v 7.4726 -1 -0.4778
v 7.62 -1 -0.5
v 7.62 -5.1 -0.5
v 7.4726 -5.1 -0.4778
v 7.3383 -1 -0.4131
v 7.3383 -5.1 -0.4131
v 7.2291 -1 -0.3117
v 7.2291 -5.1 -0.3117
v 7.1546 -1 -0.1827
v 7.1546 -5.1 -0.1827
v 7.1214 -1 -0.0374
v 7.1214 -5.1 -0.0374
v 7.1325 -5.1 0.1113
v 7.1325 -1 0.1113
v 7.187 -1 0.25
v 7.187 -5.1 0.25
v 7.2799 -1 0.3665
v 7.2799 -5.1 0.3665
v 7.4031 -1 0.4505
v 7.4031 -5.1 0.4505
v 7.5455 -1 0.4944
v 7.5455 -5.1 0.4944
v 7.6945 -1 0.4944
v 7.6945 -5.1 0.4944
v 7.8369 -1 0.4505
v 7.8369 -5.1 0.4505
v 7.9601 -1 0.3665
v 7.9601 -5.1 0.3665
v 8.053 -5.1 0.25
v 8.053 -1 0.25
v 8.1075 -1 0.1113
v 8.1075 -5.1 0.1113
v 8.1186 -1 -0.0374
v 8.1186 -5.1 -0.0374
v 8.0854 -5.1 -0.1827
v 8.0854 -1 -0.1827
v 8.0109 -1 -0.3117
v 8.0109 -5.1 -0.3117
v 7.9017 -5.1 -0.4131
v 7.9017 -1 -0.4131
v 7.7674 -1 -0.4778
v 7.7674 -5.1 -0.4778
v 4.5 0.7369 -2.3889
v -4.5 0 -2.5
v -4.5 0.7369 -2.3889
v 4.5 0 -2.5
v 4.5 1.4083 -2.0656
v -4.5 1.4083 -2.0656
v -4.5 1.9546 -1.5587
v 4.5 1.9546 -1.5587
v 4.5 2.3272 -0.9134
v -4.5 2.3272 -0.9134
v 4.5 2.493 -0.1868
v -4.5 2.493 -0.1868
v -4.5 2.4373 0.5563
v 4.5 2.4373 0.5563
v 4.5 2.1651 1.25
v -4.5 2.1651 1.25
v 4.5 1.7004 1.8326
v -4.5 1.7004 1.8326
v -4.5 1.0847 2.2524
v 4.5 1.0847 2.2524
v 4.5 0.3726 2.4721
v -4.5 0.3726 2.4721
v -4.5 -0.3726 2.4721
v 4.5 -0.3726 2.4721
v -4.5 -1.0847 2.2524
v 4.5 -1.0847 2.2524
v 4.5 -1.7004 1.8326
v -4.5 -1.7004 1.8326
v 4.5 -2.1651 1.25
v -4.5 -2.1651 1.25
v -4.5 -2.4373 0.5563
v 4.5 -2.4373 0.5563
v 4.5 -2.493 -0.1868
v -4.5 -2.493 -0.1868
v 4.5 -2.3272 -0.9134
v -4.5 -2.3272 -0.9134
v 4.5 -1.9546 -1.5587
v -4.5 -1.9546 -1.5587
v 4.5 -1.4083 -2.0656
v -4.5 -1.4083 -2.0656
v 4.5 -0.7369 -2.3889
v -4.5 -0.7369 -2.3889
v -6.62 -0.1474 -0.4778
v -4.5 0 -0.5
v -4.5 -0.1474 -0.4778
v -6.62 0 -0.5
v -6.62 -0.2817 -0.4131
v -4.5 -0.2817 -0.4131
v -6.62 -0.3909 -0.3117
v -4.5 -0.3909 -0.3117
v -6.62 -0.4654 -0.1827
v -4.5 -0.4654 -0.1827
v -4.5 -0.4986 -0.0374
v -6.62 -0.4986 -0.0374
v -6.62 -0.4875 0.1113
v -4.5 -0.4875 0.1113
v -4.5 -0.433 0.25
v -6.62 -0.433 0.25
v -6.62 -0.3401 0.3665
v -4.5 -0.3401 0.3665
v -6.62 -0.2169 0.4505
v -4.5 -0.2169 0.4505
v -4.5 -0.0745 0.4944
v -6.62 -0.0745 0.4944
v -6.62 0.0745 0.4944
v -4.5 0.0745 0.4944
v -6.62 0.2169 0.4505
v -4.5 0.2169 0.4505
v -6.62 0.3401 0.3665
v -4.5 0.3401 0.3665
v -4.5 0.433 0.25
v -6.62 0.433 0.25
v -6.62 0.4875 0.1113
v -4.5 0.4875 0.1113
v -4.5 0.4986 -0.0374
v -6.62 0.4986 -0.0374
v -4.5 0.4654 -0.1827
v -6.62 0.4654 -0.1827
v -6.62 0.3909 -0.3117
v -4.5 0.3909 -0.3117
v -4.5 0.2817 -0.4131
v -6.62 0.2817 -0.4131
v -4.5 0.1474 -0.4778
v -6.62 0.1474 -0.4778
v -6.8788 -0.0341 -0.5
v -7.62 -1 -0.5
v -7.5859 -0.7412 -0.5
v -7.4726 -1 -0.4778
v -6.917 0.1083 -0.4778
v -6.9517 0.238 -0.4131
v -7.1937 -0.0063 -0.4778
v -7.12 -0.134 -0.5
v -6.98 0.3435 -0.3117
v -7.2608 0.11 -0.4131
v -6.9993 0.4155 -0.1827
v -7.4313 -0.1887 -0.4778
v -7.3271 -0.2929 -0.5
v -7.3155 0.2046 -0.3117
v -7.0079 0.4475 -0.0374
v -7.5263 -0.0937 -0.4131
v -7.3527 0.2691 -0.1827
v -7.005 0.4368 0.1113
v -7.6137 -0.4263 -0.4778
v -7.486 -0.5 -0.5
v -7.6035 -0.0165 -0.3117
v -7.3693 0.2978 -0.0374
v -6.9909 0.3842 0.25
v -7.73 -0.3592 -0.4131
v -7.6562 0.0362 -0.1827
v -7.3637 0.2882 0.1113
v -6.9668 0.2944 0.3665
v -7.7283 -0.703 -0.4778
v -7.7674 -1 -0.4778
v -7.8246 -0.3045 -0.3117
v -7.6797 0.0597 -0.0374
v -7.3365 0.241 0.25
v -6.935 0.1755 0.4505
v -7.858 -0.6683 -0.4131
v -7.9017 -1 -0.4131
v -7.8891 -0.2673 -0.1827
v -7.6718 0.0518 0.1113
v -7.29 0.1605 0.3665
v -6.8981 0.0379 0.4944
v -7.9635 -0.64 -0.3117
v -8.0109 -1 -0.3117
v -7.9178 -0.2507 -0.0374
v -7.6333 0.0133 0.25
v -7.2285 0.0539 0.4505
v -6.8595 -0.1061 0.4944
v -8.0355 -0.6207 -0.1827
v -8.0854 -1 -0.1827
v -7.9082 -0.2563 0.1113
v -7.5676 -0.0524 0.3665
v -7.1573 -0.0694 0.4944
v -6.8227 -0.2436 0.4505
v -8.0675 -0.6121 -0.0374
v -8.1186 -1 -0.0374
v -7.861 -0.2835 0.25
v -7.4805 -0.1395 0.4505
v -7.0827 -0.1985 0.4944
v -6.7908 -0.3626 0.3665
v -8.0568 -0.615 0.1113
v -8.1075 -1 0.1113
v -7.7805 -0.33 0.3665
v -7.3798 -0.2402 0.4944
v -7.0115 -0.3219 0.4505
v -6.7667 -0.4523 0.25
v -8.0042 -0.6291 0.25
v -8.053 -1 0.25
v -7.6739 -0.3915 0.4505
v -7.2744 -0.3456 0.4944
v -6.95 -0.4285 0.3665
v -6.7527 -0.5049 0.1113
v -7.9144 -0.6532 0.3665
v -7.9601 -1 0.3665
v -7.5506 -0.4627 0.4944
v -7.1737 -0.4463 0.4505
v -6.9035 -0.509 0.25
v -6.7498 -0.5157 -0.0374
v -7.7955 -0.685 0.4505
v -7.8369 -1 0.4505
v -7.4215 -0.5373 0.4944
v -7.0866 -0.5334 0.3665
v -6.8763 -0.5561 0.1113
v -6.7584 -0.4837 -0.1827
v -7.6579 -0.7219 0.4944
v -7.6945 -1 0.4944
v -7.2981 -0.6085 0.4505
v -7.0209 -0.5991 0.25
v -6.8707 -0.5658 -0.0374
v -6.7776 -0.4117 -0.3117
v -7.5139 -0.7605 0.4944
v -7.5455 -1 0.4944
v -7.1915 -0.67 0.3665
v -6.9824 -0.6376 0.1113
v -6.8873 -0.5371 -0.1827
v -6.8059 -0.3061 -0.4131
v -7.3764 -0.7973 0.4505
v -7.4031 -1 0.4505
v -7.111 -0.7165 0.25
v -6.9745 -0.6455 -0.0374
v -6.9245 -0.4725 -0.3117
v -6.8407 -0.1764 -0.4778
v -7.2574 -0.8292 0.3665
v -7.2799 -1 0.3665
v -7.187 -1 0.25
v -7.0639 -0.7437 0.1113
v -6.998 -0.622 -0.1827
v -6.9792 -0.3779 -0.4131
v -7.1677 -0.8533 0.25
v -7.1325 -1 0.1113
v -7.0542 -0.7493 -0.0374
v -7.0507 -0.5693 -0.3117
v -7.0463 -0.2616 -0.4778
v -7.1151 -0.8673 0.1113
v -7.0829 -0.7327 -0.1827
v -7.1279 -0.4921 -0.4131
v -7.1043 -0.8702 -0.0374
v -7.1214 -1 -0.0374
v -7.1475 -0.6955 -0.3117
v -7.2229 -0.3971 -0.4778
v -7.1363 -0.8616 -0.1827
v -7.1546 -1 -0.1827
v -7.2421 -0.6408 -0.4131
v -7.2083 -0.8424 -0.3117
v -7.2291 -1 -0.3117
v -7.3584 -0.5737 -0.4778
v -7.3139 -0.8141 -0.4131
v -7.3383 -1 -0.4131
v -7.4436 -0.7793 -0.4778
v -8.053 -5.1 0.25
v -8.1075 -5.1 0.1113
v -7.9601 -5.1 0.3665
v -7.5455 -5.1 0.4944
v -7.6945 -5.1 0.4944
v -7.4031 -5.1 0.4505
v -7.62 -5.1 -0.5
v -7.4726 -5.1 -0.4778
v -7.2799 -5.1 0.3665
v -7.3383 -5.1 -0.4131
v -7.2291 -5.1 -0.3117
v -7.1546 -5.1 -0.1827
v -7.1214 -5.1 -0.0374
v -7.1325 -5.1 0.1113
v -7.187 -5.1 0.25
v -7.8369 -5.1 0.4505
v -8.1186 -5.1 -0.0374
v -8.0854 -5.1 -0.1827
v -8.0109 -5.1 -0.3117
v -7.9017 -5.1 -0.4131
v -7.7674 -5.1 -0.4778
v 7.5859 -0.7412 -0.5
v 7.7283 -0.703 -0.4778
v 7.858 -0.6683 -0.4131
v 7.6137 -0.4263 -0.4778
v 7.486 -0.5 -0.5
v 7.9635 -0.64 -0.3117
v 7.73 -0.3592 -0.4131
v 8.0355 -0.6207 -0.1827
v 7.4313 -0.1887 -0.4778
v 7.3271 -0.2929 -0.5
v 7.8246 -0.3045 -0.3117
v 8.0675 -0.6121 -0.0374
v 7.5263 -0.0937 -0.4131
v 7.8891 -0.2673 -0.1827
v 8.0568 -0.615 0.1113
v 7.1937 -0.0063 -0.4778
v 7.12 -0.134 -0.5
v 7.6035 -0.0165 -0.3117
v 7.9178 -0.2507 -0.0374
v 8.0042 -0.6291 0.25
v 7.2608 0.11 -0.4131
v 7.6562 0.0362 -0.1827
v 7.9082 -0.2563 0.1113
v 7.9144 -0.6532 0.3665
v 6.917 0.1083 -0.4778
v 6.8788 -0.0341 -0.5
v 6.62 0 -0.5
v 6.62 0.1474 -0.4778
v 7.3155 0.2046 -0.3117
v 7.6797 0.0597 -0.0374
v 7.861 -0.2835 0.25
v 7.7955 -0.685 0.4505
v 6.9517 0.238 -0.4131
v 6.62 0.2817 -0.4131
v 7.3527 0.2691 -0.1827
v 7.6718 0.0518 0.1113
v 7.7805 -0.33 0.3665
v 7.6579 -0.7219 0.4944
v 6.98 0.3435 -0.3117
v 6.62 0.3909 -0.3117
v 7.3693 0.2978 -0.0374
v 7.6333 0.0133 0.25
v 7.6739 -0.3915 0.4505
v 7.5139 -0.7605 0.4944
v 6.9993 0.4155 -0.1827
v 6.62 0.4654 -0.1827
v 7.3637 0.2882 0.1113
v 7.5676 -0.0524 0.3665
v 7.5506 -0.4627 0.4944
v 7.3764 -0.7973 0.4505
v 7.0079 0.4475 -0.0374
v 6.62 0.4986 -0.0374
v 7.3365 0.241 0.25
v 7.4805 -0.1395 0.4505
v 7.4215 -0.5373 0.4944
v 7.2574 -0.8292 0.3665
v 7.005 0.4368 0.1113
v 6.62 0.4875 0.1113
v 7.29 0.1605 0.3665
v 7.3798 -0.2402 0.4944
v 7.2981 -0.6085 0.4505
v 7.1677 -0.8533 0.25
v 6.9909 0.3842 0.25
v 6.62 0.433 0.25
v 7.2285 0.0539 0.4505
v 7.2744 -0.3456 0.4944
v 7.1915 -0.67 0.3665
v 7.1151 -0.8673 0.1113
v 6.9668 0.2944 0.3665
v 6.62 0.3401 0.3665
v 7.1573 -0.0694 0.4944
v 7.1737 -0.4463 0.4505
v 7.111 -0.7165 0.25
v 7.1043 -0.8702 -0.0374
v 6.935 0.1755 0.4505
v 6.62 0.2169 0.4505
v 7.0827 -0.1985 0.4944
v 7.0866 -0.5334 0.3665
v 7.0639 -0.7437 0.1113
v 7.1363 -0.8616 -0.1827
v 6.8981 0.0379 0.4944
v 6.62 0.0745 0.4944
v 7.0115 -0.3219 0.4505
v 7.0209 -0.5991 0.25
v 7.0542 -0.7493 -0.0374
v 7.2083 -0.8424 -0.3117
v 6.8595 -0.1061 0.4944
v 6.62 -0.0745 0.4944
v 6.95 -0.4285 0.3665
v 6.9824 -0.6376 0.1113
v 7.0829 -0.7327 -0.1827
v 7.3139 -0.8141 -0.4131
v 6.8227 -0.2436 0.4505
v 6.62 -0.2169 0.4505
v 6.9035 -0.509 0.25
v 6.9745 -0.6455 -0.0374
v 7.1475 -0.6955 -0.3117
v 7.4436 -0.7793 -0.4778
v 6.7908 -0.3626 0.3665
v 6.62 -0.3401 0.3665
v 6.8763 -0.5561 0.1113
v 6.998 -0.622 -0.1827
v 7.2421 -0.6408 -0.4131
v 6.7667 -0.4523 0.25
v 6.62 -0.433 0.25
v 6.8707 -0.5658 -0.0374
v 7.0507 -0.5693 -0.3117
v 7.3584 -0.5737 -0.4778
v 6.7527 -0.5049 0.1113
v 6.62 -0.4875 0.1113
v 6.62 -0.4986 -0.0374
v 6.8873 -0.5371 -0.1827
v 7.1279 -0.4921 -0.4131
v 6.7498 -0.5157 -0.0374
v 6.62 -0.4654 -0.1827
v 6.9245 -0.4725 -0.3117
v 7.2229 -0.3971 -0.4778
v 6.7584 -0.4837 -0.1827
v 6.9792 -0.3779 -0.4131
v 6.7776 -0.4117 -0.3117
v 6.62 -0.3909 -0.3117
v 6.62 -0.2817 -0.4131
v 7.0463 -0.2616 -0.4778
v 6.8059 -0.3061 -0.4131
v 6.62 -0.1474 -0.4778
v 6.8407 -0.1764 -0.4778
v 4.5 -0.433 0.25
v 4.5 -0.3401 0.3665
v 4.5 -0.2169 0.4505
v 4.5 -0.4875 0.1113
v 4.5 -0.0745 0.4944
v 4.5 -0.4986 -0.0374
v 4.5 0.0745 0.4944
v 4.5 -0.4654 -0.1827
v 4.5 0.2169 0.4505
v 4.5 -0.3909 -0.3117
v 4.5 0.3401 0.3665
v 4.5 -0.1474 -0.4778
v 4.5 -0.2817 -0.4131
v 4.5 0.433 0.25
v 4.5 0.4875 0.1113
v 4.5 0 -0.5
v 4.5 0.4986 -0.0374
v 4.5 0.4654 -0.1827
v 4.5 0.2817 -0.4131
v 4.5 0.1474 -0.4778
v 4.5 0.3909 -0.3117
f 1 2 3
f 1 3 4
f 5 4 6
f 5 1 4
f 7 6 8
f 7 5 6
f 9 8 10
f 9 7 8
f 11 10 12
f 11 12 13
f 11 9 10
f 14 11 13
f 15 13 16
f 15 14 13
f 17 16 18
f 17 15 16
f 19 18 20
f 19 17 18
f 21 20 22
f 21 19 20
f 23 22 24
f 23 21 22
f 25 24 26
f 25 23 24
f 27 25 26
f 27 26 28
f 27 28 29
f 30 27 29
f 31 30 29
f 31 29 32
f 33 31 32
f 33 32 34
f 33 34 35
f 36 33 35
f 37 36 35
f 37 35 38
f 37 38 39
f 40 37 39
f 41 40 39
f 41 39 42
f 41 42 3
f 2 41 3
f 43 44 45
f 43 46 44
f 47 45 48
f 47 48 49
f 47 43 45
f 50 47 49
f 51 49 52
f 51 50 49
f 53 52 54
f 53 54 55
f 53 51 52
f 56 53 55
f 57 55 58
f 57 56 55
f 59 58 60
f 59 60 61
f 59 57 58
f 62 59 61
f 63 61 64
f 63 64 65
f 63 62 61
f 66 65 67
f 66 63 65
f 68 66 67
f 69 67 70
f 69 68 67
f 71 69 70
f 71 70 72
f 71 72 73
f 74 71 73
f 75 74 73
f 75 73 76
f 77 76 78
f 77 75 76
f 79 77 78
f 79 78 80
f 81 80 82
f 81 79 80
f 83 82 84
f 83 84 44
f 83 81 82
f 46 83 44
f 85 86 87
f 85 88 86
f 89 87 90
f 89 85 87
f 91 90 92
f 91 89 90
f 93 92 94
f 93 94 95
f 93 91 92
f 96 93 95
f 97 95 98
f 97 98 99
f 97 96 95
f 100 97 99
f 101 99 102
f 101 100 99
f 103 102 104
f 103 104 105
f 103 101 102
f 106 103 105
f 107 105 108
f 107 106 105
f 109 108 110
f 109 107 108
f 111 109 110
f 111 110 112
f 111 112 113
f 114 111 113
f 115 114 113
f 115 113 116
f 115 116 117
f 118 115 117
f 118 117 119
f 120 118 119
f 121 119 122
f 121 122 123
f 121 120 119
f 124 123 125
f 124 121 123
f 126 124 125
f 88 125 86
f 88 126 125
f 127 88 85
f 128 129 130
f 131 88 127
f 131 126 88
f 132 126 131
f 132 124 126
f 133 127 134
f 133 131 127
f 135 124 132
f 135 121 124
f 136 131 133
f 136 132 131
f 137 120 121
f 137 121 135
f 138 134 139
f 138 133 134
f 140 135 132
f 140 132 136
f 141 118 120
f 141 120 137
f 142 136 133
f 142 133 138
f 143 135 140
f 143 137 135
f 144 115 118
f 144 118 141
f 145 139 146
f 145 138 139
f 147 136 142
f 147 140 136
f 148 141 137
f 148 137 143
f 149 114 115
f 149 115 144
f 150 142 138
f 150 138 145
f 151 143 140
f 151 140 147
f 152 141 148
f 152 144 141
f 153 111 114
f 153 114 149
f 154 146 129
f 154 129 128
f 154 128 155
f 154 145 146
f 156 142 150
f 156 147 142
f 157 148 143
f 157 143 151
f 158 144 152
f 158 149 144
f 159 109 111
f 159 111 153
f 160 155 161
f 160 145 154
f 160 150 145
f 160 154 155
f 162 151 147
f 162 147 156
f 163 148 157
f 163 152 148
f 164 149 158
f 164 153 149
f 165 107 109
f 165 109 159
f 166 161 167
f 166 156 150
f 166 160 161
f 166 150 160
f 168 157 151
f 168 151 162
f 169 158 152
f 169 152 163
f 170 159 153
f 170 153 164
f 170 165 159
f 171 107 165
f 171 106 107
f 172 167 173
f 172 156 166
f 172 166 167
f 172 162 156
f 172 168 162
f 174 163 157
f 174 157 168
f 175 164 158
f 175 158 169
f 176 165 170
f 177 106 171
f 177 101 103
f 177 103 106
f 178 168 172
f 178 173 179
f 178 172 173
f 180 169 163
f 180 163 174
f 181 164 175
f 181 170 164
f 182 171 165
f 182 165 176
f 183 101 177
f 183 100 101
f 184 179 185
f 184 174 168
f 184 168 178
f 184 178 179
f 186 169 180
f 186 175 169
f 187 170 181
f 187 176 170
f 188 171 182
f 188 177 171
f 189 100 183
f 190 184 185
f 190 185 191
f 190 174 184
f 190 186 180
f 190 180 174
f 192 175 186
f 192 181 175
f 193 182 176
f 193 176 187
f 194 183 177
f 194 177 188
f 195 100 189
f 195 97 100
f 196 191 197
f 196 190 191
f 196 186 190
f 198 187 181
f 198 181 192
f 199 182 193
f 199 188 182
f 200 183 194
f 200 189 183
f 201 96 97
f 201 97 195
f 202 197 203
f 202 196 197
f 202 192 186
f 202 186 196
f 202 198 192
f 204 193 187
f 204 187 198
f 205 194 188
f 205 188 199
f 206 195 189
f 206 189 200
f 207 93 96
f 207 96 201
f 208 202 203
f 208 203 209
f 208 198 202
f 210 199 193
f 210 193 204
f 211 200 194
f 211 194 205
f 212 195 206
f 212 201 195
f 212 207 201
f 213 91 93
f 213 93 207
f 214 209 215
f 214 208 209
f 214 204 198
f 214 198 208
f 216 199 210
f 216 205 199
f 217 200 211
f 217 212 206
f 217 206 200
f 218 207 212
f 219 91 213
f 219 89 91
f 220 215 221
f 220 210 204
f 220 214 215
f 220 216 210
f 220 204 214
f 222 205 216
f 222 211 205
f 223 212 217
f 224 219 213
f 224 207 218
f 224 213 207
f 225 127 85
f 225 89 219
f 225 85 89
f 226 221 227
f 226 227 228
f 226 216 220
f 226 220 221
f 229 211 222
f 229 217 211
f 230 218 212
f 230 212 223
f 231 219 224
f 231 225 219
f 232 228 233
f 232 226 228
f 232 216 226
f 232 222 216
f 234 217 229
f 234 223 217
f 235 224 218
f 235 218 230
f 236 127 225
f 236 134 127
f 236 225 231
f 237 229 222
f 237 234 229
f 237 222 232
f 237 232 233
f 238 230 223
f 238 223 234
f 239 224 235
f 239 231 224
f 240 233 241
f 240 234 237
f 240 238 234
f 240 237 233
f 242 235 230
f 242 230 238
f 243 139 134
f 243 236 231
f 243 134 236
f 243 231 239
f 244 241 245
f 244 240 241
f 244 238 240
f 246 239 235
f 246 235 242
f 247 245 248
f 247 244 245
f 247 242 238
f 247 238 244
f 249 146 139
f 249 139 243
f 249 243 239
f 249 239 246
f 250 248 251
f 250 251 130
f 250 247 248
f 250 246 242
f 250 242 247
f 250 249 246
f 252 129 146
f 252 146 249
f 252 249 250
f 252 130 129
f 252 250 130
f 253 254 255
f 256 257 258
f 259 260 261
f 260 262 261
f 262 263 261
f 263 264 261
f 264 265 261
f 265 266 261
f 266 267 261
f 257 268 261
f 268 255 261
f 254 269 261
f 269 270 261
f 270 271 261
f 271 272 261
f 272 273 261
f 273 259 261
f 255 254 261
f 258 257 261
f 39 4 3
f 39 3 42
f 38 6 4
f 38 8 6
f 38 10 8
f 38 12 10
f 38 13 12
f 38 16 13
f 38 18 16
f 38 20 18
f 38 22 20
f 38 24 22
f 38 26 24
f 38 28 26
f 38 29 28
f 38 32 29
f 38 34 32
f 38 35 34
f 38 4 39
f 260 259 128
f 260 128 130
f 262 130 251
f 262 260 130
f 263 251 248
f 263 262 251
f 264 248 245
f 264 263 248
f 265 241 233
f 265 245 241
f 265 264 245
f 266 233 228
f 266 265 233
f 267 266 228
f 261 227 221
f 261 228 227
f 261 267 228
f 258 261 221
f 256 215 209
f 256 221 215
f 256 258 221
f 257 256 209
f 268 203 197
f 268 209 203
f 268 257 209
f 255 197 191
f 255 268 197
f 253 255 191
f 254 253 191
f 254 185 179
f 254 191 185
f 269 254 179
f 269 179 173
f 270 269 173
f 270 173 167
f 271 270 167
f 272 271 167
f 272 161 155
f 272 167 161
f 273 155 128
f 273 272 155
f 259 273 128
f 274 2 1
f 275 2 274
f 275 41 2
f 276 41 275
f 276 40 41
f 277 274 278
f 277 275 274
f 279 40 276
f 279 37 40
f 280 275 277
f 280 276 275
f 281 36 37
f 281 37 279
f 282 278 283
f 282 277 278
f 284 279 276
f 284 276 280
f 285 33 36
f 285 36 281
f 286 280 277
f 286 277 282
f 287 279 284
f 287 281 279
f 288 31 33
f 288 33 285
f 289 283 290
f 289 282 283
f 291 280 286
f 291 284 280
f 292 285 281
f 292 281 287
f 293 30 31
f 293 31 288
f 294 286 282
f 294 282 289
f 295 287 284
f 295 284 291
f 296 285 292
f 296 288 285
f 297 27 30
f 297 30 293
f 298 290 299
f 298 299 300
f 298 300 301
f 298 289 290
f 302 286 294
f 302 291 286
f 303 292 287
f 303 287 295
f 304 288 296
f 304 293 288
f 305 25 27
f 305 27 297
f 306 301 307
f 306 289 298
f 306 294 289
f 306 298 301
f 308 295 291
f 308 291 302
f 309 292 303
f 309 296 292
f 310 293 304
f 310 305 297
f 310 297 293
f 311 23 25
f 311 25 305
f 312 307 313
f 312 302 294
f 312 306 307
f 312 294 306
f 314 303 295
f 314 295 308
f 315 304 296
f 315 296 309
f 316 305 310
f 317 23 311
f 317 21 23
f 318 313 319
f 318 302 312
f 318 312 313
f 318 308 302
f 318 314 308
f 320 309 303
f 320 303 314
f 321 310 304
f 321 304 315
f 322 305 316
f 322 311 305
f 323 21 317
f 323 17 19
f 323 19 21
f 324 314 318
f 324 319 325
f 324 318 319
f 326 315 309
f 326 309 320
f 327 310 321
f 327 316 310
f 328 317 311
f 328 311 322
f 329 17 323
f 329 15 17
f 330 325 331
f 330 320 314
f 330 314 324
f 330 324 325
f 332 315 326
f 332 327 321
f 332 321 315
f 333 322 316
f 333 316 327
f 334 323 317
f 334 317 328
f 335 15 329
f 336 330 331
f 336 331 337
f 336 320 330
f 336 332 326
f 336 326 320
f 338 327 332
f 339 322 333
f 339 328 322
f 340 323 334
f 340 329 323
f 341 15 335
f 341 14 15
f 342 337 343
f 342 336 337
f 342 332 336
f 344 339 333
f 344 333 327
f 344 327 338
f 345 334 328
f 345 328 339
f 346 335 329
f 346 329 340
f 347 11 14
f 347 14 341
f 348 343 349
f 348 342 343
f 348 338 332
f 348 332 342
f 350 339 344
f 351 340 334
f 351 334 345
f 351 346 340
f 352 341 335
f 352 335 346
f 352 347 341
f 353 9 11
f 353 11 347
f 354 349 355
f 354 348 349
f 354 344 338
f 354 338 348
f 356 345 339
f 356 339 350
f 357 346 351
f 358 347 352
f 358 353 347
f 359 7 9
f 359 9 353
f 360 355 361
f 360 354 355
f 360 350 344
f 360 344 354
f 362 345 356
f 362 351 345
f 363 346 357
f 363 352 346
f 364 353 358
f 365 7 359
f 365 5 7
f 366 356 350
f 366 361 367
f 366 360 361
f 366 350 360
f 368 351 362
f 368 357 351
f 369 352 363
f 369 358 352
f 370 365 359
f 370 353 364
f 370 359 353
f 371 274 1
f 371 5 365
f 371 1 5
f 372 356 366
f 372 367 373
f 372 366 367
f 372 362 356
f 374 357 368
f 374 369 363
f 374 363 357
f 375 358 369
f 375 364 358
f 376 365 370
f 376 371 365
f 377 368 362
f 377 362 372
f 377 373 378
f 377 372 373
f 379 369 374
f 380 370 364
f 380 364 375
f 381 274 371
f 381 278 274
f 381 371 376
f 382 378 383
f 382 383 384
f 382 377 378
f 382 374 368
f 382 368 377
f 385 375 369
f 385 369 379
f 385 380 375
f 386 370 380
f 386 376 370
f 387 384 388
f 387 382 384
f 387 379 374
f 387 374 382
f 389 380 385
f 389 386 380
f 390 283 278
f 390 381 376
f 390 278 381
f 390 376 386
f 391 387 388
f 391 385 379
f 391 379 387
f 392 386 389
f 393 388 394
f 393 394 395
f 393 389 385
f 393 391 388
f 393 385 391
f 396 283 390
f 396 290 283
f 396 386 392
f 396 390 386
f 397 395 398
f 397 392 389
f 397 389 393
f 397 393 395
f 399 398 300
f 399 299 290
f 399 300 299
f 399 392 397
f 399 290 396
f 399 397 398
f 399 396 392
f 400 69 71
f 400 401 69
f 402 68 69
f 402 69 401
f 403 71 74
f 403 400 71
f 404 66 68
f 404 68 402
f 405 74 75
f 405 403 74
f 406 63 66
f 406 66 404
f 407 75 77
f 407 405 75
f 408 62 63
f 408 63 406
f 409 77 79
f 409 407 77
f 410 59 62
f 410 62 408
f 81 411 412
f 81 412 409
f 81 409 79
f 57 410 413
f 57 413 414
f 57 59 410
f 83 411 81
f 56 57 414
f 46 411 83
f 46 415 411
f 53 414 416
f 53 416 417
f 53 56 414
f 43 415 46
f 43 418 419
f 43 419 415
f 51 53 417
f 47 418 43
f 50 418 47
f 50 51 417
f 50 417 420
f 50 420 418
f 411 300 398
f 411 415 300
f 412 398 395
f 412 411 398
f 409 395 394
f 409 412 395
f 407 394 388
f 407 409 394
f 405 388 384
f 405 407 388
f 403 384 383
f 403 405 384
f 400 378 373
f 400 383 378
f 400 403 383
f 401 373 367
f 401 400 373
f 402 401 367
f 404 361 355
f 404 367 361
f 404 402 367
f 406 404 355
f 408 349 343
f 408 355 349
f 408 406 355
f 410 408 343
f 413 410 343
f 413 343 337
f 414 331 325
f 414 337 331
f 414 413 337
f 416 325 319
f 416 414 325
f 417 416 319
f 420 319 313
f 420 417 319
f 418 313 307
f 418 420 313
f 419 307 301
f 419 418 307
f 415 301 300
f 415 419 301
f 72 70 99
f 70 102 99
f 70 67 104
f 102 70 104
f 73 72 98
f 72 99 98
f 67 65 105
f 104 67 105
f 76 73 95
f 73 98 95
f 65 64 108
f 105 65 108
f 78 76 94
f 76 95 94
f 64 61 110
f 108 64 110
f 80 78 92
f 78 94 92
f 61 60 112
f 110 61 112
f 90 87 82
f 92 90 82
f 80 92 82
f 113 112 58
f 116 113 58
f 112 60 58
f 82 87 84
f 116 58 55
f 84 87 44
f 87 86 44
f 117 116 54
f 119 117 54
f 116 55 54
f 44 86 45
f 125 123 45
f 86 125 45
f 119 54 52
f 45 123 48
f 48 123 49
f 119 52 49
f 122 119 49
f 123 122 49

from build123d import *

# Parameters (mm, degrees)
EXTRUDE_1_DEPTH      = 4.5
EXTRUDE_1_DEPTH_BACK = 4.5
SKETCH_1_R           = 2.5
SKETCH_3_R           = 0.5


with BuildPart() as part:
    # Эскиз1 → Бобышка-Вытянуть1 (new, two sides: drawn at the far end of the back side and taken through both)
    with BuildSketch(Plane(origin=(0, 0, 0), x_dir=(0, 0, -1), z_dir=(1, 0, 0)).offset(-EXTRUDE_1_DEPTH_BACK)):
        Circle(SKETCH_1_R)
    extrude(amount=EXTRUDE_1_DEPTH + EXTRUDE_1_DEPTH_BACK)

    # По траектории1: sweep along a path in Эскиз2
    with BuildLine(Plane.XY) as sweep_1_path:
        Line((7.62, -5.1), (7.62, -1))
        ThreePointArc((7.62, -1), (7.327106781, -0.292893219), (6.62, 0))
        Line((6.62, 0), (-6.62, 0))
        ThreePointArc((-6.62, 0), (-7.327106781, -0.292893219), (-7.62, -1))
        Line((-7.62, -1), (-7.62, -5.1))
    # Эскиз3 → По траектории1 (sweep)
    with BuildSketch(Plane(origin=(4.5, 0, 0), x_dir=(0, 0, -1), z_dir=(1, 0, 0))):
        Circle(SKETCH_3_R)
    sweep(path=sweep_1_path.line)


solid = part.part
